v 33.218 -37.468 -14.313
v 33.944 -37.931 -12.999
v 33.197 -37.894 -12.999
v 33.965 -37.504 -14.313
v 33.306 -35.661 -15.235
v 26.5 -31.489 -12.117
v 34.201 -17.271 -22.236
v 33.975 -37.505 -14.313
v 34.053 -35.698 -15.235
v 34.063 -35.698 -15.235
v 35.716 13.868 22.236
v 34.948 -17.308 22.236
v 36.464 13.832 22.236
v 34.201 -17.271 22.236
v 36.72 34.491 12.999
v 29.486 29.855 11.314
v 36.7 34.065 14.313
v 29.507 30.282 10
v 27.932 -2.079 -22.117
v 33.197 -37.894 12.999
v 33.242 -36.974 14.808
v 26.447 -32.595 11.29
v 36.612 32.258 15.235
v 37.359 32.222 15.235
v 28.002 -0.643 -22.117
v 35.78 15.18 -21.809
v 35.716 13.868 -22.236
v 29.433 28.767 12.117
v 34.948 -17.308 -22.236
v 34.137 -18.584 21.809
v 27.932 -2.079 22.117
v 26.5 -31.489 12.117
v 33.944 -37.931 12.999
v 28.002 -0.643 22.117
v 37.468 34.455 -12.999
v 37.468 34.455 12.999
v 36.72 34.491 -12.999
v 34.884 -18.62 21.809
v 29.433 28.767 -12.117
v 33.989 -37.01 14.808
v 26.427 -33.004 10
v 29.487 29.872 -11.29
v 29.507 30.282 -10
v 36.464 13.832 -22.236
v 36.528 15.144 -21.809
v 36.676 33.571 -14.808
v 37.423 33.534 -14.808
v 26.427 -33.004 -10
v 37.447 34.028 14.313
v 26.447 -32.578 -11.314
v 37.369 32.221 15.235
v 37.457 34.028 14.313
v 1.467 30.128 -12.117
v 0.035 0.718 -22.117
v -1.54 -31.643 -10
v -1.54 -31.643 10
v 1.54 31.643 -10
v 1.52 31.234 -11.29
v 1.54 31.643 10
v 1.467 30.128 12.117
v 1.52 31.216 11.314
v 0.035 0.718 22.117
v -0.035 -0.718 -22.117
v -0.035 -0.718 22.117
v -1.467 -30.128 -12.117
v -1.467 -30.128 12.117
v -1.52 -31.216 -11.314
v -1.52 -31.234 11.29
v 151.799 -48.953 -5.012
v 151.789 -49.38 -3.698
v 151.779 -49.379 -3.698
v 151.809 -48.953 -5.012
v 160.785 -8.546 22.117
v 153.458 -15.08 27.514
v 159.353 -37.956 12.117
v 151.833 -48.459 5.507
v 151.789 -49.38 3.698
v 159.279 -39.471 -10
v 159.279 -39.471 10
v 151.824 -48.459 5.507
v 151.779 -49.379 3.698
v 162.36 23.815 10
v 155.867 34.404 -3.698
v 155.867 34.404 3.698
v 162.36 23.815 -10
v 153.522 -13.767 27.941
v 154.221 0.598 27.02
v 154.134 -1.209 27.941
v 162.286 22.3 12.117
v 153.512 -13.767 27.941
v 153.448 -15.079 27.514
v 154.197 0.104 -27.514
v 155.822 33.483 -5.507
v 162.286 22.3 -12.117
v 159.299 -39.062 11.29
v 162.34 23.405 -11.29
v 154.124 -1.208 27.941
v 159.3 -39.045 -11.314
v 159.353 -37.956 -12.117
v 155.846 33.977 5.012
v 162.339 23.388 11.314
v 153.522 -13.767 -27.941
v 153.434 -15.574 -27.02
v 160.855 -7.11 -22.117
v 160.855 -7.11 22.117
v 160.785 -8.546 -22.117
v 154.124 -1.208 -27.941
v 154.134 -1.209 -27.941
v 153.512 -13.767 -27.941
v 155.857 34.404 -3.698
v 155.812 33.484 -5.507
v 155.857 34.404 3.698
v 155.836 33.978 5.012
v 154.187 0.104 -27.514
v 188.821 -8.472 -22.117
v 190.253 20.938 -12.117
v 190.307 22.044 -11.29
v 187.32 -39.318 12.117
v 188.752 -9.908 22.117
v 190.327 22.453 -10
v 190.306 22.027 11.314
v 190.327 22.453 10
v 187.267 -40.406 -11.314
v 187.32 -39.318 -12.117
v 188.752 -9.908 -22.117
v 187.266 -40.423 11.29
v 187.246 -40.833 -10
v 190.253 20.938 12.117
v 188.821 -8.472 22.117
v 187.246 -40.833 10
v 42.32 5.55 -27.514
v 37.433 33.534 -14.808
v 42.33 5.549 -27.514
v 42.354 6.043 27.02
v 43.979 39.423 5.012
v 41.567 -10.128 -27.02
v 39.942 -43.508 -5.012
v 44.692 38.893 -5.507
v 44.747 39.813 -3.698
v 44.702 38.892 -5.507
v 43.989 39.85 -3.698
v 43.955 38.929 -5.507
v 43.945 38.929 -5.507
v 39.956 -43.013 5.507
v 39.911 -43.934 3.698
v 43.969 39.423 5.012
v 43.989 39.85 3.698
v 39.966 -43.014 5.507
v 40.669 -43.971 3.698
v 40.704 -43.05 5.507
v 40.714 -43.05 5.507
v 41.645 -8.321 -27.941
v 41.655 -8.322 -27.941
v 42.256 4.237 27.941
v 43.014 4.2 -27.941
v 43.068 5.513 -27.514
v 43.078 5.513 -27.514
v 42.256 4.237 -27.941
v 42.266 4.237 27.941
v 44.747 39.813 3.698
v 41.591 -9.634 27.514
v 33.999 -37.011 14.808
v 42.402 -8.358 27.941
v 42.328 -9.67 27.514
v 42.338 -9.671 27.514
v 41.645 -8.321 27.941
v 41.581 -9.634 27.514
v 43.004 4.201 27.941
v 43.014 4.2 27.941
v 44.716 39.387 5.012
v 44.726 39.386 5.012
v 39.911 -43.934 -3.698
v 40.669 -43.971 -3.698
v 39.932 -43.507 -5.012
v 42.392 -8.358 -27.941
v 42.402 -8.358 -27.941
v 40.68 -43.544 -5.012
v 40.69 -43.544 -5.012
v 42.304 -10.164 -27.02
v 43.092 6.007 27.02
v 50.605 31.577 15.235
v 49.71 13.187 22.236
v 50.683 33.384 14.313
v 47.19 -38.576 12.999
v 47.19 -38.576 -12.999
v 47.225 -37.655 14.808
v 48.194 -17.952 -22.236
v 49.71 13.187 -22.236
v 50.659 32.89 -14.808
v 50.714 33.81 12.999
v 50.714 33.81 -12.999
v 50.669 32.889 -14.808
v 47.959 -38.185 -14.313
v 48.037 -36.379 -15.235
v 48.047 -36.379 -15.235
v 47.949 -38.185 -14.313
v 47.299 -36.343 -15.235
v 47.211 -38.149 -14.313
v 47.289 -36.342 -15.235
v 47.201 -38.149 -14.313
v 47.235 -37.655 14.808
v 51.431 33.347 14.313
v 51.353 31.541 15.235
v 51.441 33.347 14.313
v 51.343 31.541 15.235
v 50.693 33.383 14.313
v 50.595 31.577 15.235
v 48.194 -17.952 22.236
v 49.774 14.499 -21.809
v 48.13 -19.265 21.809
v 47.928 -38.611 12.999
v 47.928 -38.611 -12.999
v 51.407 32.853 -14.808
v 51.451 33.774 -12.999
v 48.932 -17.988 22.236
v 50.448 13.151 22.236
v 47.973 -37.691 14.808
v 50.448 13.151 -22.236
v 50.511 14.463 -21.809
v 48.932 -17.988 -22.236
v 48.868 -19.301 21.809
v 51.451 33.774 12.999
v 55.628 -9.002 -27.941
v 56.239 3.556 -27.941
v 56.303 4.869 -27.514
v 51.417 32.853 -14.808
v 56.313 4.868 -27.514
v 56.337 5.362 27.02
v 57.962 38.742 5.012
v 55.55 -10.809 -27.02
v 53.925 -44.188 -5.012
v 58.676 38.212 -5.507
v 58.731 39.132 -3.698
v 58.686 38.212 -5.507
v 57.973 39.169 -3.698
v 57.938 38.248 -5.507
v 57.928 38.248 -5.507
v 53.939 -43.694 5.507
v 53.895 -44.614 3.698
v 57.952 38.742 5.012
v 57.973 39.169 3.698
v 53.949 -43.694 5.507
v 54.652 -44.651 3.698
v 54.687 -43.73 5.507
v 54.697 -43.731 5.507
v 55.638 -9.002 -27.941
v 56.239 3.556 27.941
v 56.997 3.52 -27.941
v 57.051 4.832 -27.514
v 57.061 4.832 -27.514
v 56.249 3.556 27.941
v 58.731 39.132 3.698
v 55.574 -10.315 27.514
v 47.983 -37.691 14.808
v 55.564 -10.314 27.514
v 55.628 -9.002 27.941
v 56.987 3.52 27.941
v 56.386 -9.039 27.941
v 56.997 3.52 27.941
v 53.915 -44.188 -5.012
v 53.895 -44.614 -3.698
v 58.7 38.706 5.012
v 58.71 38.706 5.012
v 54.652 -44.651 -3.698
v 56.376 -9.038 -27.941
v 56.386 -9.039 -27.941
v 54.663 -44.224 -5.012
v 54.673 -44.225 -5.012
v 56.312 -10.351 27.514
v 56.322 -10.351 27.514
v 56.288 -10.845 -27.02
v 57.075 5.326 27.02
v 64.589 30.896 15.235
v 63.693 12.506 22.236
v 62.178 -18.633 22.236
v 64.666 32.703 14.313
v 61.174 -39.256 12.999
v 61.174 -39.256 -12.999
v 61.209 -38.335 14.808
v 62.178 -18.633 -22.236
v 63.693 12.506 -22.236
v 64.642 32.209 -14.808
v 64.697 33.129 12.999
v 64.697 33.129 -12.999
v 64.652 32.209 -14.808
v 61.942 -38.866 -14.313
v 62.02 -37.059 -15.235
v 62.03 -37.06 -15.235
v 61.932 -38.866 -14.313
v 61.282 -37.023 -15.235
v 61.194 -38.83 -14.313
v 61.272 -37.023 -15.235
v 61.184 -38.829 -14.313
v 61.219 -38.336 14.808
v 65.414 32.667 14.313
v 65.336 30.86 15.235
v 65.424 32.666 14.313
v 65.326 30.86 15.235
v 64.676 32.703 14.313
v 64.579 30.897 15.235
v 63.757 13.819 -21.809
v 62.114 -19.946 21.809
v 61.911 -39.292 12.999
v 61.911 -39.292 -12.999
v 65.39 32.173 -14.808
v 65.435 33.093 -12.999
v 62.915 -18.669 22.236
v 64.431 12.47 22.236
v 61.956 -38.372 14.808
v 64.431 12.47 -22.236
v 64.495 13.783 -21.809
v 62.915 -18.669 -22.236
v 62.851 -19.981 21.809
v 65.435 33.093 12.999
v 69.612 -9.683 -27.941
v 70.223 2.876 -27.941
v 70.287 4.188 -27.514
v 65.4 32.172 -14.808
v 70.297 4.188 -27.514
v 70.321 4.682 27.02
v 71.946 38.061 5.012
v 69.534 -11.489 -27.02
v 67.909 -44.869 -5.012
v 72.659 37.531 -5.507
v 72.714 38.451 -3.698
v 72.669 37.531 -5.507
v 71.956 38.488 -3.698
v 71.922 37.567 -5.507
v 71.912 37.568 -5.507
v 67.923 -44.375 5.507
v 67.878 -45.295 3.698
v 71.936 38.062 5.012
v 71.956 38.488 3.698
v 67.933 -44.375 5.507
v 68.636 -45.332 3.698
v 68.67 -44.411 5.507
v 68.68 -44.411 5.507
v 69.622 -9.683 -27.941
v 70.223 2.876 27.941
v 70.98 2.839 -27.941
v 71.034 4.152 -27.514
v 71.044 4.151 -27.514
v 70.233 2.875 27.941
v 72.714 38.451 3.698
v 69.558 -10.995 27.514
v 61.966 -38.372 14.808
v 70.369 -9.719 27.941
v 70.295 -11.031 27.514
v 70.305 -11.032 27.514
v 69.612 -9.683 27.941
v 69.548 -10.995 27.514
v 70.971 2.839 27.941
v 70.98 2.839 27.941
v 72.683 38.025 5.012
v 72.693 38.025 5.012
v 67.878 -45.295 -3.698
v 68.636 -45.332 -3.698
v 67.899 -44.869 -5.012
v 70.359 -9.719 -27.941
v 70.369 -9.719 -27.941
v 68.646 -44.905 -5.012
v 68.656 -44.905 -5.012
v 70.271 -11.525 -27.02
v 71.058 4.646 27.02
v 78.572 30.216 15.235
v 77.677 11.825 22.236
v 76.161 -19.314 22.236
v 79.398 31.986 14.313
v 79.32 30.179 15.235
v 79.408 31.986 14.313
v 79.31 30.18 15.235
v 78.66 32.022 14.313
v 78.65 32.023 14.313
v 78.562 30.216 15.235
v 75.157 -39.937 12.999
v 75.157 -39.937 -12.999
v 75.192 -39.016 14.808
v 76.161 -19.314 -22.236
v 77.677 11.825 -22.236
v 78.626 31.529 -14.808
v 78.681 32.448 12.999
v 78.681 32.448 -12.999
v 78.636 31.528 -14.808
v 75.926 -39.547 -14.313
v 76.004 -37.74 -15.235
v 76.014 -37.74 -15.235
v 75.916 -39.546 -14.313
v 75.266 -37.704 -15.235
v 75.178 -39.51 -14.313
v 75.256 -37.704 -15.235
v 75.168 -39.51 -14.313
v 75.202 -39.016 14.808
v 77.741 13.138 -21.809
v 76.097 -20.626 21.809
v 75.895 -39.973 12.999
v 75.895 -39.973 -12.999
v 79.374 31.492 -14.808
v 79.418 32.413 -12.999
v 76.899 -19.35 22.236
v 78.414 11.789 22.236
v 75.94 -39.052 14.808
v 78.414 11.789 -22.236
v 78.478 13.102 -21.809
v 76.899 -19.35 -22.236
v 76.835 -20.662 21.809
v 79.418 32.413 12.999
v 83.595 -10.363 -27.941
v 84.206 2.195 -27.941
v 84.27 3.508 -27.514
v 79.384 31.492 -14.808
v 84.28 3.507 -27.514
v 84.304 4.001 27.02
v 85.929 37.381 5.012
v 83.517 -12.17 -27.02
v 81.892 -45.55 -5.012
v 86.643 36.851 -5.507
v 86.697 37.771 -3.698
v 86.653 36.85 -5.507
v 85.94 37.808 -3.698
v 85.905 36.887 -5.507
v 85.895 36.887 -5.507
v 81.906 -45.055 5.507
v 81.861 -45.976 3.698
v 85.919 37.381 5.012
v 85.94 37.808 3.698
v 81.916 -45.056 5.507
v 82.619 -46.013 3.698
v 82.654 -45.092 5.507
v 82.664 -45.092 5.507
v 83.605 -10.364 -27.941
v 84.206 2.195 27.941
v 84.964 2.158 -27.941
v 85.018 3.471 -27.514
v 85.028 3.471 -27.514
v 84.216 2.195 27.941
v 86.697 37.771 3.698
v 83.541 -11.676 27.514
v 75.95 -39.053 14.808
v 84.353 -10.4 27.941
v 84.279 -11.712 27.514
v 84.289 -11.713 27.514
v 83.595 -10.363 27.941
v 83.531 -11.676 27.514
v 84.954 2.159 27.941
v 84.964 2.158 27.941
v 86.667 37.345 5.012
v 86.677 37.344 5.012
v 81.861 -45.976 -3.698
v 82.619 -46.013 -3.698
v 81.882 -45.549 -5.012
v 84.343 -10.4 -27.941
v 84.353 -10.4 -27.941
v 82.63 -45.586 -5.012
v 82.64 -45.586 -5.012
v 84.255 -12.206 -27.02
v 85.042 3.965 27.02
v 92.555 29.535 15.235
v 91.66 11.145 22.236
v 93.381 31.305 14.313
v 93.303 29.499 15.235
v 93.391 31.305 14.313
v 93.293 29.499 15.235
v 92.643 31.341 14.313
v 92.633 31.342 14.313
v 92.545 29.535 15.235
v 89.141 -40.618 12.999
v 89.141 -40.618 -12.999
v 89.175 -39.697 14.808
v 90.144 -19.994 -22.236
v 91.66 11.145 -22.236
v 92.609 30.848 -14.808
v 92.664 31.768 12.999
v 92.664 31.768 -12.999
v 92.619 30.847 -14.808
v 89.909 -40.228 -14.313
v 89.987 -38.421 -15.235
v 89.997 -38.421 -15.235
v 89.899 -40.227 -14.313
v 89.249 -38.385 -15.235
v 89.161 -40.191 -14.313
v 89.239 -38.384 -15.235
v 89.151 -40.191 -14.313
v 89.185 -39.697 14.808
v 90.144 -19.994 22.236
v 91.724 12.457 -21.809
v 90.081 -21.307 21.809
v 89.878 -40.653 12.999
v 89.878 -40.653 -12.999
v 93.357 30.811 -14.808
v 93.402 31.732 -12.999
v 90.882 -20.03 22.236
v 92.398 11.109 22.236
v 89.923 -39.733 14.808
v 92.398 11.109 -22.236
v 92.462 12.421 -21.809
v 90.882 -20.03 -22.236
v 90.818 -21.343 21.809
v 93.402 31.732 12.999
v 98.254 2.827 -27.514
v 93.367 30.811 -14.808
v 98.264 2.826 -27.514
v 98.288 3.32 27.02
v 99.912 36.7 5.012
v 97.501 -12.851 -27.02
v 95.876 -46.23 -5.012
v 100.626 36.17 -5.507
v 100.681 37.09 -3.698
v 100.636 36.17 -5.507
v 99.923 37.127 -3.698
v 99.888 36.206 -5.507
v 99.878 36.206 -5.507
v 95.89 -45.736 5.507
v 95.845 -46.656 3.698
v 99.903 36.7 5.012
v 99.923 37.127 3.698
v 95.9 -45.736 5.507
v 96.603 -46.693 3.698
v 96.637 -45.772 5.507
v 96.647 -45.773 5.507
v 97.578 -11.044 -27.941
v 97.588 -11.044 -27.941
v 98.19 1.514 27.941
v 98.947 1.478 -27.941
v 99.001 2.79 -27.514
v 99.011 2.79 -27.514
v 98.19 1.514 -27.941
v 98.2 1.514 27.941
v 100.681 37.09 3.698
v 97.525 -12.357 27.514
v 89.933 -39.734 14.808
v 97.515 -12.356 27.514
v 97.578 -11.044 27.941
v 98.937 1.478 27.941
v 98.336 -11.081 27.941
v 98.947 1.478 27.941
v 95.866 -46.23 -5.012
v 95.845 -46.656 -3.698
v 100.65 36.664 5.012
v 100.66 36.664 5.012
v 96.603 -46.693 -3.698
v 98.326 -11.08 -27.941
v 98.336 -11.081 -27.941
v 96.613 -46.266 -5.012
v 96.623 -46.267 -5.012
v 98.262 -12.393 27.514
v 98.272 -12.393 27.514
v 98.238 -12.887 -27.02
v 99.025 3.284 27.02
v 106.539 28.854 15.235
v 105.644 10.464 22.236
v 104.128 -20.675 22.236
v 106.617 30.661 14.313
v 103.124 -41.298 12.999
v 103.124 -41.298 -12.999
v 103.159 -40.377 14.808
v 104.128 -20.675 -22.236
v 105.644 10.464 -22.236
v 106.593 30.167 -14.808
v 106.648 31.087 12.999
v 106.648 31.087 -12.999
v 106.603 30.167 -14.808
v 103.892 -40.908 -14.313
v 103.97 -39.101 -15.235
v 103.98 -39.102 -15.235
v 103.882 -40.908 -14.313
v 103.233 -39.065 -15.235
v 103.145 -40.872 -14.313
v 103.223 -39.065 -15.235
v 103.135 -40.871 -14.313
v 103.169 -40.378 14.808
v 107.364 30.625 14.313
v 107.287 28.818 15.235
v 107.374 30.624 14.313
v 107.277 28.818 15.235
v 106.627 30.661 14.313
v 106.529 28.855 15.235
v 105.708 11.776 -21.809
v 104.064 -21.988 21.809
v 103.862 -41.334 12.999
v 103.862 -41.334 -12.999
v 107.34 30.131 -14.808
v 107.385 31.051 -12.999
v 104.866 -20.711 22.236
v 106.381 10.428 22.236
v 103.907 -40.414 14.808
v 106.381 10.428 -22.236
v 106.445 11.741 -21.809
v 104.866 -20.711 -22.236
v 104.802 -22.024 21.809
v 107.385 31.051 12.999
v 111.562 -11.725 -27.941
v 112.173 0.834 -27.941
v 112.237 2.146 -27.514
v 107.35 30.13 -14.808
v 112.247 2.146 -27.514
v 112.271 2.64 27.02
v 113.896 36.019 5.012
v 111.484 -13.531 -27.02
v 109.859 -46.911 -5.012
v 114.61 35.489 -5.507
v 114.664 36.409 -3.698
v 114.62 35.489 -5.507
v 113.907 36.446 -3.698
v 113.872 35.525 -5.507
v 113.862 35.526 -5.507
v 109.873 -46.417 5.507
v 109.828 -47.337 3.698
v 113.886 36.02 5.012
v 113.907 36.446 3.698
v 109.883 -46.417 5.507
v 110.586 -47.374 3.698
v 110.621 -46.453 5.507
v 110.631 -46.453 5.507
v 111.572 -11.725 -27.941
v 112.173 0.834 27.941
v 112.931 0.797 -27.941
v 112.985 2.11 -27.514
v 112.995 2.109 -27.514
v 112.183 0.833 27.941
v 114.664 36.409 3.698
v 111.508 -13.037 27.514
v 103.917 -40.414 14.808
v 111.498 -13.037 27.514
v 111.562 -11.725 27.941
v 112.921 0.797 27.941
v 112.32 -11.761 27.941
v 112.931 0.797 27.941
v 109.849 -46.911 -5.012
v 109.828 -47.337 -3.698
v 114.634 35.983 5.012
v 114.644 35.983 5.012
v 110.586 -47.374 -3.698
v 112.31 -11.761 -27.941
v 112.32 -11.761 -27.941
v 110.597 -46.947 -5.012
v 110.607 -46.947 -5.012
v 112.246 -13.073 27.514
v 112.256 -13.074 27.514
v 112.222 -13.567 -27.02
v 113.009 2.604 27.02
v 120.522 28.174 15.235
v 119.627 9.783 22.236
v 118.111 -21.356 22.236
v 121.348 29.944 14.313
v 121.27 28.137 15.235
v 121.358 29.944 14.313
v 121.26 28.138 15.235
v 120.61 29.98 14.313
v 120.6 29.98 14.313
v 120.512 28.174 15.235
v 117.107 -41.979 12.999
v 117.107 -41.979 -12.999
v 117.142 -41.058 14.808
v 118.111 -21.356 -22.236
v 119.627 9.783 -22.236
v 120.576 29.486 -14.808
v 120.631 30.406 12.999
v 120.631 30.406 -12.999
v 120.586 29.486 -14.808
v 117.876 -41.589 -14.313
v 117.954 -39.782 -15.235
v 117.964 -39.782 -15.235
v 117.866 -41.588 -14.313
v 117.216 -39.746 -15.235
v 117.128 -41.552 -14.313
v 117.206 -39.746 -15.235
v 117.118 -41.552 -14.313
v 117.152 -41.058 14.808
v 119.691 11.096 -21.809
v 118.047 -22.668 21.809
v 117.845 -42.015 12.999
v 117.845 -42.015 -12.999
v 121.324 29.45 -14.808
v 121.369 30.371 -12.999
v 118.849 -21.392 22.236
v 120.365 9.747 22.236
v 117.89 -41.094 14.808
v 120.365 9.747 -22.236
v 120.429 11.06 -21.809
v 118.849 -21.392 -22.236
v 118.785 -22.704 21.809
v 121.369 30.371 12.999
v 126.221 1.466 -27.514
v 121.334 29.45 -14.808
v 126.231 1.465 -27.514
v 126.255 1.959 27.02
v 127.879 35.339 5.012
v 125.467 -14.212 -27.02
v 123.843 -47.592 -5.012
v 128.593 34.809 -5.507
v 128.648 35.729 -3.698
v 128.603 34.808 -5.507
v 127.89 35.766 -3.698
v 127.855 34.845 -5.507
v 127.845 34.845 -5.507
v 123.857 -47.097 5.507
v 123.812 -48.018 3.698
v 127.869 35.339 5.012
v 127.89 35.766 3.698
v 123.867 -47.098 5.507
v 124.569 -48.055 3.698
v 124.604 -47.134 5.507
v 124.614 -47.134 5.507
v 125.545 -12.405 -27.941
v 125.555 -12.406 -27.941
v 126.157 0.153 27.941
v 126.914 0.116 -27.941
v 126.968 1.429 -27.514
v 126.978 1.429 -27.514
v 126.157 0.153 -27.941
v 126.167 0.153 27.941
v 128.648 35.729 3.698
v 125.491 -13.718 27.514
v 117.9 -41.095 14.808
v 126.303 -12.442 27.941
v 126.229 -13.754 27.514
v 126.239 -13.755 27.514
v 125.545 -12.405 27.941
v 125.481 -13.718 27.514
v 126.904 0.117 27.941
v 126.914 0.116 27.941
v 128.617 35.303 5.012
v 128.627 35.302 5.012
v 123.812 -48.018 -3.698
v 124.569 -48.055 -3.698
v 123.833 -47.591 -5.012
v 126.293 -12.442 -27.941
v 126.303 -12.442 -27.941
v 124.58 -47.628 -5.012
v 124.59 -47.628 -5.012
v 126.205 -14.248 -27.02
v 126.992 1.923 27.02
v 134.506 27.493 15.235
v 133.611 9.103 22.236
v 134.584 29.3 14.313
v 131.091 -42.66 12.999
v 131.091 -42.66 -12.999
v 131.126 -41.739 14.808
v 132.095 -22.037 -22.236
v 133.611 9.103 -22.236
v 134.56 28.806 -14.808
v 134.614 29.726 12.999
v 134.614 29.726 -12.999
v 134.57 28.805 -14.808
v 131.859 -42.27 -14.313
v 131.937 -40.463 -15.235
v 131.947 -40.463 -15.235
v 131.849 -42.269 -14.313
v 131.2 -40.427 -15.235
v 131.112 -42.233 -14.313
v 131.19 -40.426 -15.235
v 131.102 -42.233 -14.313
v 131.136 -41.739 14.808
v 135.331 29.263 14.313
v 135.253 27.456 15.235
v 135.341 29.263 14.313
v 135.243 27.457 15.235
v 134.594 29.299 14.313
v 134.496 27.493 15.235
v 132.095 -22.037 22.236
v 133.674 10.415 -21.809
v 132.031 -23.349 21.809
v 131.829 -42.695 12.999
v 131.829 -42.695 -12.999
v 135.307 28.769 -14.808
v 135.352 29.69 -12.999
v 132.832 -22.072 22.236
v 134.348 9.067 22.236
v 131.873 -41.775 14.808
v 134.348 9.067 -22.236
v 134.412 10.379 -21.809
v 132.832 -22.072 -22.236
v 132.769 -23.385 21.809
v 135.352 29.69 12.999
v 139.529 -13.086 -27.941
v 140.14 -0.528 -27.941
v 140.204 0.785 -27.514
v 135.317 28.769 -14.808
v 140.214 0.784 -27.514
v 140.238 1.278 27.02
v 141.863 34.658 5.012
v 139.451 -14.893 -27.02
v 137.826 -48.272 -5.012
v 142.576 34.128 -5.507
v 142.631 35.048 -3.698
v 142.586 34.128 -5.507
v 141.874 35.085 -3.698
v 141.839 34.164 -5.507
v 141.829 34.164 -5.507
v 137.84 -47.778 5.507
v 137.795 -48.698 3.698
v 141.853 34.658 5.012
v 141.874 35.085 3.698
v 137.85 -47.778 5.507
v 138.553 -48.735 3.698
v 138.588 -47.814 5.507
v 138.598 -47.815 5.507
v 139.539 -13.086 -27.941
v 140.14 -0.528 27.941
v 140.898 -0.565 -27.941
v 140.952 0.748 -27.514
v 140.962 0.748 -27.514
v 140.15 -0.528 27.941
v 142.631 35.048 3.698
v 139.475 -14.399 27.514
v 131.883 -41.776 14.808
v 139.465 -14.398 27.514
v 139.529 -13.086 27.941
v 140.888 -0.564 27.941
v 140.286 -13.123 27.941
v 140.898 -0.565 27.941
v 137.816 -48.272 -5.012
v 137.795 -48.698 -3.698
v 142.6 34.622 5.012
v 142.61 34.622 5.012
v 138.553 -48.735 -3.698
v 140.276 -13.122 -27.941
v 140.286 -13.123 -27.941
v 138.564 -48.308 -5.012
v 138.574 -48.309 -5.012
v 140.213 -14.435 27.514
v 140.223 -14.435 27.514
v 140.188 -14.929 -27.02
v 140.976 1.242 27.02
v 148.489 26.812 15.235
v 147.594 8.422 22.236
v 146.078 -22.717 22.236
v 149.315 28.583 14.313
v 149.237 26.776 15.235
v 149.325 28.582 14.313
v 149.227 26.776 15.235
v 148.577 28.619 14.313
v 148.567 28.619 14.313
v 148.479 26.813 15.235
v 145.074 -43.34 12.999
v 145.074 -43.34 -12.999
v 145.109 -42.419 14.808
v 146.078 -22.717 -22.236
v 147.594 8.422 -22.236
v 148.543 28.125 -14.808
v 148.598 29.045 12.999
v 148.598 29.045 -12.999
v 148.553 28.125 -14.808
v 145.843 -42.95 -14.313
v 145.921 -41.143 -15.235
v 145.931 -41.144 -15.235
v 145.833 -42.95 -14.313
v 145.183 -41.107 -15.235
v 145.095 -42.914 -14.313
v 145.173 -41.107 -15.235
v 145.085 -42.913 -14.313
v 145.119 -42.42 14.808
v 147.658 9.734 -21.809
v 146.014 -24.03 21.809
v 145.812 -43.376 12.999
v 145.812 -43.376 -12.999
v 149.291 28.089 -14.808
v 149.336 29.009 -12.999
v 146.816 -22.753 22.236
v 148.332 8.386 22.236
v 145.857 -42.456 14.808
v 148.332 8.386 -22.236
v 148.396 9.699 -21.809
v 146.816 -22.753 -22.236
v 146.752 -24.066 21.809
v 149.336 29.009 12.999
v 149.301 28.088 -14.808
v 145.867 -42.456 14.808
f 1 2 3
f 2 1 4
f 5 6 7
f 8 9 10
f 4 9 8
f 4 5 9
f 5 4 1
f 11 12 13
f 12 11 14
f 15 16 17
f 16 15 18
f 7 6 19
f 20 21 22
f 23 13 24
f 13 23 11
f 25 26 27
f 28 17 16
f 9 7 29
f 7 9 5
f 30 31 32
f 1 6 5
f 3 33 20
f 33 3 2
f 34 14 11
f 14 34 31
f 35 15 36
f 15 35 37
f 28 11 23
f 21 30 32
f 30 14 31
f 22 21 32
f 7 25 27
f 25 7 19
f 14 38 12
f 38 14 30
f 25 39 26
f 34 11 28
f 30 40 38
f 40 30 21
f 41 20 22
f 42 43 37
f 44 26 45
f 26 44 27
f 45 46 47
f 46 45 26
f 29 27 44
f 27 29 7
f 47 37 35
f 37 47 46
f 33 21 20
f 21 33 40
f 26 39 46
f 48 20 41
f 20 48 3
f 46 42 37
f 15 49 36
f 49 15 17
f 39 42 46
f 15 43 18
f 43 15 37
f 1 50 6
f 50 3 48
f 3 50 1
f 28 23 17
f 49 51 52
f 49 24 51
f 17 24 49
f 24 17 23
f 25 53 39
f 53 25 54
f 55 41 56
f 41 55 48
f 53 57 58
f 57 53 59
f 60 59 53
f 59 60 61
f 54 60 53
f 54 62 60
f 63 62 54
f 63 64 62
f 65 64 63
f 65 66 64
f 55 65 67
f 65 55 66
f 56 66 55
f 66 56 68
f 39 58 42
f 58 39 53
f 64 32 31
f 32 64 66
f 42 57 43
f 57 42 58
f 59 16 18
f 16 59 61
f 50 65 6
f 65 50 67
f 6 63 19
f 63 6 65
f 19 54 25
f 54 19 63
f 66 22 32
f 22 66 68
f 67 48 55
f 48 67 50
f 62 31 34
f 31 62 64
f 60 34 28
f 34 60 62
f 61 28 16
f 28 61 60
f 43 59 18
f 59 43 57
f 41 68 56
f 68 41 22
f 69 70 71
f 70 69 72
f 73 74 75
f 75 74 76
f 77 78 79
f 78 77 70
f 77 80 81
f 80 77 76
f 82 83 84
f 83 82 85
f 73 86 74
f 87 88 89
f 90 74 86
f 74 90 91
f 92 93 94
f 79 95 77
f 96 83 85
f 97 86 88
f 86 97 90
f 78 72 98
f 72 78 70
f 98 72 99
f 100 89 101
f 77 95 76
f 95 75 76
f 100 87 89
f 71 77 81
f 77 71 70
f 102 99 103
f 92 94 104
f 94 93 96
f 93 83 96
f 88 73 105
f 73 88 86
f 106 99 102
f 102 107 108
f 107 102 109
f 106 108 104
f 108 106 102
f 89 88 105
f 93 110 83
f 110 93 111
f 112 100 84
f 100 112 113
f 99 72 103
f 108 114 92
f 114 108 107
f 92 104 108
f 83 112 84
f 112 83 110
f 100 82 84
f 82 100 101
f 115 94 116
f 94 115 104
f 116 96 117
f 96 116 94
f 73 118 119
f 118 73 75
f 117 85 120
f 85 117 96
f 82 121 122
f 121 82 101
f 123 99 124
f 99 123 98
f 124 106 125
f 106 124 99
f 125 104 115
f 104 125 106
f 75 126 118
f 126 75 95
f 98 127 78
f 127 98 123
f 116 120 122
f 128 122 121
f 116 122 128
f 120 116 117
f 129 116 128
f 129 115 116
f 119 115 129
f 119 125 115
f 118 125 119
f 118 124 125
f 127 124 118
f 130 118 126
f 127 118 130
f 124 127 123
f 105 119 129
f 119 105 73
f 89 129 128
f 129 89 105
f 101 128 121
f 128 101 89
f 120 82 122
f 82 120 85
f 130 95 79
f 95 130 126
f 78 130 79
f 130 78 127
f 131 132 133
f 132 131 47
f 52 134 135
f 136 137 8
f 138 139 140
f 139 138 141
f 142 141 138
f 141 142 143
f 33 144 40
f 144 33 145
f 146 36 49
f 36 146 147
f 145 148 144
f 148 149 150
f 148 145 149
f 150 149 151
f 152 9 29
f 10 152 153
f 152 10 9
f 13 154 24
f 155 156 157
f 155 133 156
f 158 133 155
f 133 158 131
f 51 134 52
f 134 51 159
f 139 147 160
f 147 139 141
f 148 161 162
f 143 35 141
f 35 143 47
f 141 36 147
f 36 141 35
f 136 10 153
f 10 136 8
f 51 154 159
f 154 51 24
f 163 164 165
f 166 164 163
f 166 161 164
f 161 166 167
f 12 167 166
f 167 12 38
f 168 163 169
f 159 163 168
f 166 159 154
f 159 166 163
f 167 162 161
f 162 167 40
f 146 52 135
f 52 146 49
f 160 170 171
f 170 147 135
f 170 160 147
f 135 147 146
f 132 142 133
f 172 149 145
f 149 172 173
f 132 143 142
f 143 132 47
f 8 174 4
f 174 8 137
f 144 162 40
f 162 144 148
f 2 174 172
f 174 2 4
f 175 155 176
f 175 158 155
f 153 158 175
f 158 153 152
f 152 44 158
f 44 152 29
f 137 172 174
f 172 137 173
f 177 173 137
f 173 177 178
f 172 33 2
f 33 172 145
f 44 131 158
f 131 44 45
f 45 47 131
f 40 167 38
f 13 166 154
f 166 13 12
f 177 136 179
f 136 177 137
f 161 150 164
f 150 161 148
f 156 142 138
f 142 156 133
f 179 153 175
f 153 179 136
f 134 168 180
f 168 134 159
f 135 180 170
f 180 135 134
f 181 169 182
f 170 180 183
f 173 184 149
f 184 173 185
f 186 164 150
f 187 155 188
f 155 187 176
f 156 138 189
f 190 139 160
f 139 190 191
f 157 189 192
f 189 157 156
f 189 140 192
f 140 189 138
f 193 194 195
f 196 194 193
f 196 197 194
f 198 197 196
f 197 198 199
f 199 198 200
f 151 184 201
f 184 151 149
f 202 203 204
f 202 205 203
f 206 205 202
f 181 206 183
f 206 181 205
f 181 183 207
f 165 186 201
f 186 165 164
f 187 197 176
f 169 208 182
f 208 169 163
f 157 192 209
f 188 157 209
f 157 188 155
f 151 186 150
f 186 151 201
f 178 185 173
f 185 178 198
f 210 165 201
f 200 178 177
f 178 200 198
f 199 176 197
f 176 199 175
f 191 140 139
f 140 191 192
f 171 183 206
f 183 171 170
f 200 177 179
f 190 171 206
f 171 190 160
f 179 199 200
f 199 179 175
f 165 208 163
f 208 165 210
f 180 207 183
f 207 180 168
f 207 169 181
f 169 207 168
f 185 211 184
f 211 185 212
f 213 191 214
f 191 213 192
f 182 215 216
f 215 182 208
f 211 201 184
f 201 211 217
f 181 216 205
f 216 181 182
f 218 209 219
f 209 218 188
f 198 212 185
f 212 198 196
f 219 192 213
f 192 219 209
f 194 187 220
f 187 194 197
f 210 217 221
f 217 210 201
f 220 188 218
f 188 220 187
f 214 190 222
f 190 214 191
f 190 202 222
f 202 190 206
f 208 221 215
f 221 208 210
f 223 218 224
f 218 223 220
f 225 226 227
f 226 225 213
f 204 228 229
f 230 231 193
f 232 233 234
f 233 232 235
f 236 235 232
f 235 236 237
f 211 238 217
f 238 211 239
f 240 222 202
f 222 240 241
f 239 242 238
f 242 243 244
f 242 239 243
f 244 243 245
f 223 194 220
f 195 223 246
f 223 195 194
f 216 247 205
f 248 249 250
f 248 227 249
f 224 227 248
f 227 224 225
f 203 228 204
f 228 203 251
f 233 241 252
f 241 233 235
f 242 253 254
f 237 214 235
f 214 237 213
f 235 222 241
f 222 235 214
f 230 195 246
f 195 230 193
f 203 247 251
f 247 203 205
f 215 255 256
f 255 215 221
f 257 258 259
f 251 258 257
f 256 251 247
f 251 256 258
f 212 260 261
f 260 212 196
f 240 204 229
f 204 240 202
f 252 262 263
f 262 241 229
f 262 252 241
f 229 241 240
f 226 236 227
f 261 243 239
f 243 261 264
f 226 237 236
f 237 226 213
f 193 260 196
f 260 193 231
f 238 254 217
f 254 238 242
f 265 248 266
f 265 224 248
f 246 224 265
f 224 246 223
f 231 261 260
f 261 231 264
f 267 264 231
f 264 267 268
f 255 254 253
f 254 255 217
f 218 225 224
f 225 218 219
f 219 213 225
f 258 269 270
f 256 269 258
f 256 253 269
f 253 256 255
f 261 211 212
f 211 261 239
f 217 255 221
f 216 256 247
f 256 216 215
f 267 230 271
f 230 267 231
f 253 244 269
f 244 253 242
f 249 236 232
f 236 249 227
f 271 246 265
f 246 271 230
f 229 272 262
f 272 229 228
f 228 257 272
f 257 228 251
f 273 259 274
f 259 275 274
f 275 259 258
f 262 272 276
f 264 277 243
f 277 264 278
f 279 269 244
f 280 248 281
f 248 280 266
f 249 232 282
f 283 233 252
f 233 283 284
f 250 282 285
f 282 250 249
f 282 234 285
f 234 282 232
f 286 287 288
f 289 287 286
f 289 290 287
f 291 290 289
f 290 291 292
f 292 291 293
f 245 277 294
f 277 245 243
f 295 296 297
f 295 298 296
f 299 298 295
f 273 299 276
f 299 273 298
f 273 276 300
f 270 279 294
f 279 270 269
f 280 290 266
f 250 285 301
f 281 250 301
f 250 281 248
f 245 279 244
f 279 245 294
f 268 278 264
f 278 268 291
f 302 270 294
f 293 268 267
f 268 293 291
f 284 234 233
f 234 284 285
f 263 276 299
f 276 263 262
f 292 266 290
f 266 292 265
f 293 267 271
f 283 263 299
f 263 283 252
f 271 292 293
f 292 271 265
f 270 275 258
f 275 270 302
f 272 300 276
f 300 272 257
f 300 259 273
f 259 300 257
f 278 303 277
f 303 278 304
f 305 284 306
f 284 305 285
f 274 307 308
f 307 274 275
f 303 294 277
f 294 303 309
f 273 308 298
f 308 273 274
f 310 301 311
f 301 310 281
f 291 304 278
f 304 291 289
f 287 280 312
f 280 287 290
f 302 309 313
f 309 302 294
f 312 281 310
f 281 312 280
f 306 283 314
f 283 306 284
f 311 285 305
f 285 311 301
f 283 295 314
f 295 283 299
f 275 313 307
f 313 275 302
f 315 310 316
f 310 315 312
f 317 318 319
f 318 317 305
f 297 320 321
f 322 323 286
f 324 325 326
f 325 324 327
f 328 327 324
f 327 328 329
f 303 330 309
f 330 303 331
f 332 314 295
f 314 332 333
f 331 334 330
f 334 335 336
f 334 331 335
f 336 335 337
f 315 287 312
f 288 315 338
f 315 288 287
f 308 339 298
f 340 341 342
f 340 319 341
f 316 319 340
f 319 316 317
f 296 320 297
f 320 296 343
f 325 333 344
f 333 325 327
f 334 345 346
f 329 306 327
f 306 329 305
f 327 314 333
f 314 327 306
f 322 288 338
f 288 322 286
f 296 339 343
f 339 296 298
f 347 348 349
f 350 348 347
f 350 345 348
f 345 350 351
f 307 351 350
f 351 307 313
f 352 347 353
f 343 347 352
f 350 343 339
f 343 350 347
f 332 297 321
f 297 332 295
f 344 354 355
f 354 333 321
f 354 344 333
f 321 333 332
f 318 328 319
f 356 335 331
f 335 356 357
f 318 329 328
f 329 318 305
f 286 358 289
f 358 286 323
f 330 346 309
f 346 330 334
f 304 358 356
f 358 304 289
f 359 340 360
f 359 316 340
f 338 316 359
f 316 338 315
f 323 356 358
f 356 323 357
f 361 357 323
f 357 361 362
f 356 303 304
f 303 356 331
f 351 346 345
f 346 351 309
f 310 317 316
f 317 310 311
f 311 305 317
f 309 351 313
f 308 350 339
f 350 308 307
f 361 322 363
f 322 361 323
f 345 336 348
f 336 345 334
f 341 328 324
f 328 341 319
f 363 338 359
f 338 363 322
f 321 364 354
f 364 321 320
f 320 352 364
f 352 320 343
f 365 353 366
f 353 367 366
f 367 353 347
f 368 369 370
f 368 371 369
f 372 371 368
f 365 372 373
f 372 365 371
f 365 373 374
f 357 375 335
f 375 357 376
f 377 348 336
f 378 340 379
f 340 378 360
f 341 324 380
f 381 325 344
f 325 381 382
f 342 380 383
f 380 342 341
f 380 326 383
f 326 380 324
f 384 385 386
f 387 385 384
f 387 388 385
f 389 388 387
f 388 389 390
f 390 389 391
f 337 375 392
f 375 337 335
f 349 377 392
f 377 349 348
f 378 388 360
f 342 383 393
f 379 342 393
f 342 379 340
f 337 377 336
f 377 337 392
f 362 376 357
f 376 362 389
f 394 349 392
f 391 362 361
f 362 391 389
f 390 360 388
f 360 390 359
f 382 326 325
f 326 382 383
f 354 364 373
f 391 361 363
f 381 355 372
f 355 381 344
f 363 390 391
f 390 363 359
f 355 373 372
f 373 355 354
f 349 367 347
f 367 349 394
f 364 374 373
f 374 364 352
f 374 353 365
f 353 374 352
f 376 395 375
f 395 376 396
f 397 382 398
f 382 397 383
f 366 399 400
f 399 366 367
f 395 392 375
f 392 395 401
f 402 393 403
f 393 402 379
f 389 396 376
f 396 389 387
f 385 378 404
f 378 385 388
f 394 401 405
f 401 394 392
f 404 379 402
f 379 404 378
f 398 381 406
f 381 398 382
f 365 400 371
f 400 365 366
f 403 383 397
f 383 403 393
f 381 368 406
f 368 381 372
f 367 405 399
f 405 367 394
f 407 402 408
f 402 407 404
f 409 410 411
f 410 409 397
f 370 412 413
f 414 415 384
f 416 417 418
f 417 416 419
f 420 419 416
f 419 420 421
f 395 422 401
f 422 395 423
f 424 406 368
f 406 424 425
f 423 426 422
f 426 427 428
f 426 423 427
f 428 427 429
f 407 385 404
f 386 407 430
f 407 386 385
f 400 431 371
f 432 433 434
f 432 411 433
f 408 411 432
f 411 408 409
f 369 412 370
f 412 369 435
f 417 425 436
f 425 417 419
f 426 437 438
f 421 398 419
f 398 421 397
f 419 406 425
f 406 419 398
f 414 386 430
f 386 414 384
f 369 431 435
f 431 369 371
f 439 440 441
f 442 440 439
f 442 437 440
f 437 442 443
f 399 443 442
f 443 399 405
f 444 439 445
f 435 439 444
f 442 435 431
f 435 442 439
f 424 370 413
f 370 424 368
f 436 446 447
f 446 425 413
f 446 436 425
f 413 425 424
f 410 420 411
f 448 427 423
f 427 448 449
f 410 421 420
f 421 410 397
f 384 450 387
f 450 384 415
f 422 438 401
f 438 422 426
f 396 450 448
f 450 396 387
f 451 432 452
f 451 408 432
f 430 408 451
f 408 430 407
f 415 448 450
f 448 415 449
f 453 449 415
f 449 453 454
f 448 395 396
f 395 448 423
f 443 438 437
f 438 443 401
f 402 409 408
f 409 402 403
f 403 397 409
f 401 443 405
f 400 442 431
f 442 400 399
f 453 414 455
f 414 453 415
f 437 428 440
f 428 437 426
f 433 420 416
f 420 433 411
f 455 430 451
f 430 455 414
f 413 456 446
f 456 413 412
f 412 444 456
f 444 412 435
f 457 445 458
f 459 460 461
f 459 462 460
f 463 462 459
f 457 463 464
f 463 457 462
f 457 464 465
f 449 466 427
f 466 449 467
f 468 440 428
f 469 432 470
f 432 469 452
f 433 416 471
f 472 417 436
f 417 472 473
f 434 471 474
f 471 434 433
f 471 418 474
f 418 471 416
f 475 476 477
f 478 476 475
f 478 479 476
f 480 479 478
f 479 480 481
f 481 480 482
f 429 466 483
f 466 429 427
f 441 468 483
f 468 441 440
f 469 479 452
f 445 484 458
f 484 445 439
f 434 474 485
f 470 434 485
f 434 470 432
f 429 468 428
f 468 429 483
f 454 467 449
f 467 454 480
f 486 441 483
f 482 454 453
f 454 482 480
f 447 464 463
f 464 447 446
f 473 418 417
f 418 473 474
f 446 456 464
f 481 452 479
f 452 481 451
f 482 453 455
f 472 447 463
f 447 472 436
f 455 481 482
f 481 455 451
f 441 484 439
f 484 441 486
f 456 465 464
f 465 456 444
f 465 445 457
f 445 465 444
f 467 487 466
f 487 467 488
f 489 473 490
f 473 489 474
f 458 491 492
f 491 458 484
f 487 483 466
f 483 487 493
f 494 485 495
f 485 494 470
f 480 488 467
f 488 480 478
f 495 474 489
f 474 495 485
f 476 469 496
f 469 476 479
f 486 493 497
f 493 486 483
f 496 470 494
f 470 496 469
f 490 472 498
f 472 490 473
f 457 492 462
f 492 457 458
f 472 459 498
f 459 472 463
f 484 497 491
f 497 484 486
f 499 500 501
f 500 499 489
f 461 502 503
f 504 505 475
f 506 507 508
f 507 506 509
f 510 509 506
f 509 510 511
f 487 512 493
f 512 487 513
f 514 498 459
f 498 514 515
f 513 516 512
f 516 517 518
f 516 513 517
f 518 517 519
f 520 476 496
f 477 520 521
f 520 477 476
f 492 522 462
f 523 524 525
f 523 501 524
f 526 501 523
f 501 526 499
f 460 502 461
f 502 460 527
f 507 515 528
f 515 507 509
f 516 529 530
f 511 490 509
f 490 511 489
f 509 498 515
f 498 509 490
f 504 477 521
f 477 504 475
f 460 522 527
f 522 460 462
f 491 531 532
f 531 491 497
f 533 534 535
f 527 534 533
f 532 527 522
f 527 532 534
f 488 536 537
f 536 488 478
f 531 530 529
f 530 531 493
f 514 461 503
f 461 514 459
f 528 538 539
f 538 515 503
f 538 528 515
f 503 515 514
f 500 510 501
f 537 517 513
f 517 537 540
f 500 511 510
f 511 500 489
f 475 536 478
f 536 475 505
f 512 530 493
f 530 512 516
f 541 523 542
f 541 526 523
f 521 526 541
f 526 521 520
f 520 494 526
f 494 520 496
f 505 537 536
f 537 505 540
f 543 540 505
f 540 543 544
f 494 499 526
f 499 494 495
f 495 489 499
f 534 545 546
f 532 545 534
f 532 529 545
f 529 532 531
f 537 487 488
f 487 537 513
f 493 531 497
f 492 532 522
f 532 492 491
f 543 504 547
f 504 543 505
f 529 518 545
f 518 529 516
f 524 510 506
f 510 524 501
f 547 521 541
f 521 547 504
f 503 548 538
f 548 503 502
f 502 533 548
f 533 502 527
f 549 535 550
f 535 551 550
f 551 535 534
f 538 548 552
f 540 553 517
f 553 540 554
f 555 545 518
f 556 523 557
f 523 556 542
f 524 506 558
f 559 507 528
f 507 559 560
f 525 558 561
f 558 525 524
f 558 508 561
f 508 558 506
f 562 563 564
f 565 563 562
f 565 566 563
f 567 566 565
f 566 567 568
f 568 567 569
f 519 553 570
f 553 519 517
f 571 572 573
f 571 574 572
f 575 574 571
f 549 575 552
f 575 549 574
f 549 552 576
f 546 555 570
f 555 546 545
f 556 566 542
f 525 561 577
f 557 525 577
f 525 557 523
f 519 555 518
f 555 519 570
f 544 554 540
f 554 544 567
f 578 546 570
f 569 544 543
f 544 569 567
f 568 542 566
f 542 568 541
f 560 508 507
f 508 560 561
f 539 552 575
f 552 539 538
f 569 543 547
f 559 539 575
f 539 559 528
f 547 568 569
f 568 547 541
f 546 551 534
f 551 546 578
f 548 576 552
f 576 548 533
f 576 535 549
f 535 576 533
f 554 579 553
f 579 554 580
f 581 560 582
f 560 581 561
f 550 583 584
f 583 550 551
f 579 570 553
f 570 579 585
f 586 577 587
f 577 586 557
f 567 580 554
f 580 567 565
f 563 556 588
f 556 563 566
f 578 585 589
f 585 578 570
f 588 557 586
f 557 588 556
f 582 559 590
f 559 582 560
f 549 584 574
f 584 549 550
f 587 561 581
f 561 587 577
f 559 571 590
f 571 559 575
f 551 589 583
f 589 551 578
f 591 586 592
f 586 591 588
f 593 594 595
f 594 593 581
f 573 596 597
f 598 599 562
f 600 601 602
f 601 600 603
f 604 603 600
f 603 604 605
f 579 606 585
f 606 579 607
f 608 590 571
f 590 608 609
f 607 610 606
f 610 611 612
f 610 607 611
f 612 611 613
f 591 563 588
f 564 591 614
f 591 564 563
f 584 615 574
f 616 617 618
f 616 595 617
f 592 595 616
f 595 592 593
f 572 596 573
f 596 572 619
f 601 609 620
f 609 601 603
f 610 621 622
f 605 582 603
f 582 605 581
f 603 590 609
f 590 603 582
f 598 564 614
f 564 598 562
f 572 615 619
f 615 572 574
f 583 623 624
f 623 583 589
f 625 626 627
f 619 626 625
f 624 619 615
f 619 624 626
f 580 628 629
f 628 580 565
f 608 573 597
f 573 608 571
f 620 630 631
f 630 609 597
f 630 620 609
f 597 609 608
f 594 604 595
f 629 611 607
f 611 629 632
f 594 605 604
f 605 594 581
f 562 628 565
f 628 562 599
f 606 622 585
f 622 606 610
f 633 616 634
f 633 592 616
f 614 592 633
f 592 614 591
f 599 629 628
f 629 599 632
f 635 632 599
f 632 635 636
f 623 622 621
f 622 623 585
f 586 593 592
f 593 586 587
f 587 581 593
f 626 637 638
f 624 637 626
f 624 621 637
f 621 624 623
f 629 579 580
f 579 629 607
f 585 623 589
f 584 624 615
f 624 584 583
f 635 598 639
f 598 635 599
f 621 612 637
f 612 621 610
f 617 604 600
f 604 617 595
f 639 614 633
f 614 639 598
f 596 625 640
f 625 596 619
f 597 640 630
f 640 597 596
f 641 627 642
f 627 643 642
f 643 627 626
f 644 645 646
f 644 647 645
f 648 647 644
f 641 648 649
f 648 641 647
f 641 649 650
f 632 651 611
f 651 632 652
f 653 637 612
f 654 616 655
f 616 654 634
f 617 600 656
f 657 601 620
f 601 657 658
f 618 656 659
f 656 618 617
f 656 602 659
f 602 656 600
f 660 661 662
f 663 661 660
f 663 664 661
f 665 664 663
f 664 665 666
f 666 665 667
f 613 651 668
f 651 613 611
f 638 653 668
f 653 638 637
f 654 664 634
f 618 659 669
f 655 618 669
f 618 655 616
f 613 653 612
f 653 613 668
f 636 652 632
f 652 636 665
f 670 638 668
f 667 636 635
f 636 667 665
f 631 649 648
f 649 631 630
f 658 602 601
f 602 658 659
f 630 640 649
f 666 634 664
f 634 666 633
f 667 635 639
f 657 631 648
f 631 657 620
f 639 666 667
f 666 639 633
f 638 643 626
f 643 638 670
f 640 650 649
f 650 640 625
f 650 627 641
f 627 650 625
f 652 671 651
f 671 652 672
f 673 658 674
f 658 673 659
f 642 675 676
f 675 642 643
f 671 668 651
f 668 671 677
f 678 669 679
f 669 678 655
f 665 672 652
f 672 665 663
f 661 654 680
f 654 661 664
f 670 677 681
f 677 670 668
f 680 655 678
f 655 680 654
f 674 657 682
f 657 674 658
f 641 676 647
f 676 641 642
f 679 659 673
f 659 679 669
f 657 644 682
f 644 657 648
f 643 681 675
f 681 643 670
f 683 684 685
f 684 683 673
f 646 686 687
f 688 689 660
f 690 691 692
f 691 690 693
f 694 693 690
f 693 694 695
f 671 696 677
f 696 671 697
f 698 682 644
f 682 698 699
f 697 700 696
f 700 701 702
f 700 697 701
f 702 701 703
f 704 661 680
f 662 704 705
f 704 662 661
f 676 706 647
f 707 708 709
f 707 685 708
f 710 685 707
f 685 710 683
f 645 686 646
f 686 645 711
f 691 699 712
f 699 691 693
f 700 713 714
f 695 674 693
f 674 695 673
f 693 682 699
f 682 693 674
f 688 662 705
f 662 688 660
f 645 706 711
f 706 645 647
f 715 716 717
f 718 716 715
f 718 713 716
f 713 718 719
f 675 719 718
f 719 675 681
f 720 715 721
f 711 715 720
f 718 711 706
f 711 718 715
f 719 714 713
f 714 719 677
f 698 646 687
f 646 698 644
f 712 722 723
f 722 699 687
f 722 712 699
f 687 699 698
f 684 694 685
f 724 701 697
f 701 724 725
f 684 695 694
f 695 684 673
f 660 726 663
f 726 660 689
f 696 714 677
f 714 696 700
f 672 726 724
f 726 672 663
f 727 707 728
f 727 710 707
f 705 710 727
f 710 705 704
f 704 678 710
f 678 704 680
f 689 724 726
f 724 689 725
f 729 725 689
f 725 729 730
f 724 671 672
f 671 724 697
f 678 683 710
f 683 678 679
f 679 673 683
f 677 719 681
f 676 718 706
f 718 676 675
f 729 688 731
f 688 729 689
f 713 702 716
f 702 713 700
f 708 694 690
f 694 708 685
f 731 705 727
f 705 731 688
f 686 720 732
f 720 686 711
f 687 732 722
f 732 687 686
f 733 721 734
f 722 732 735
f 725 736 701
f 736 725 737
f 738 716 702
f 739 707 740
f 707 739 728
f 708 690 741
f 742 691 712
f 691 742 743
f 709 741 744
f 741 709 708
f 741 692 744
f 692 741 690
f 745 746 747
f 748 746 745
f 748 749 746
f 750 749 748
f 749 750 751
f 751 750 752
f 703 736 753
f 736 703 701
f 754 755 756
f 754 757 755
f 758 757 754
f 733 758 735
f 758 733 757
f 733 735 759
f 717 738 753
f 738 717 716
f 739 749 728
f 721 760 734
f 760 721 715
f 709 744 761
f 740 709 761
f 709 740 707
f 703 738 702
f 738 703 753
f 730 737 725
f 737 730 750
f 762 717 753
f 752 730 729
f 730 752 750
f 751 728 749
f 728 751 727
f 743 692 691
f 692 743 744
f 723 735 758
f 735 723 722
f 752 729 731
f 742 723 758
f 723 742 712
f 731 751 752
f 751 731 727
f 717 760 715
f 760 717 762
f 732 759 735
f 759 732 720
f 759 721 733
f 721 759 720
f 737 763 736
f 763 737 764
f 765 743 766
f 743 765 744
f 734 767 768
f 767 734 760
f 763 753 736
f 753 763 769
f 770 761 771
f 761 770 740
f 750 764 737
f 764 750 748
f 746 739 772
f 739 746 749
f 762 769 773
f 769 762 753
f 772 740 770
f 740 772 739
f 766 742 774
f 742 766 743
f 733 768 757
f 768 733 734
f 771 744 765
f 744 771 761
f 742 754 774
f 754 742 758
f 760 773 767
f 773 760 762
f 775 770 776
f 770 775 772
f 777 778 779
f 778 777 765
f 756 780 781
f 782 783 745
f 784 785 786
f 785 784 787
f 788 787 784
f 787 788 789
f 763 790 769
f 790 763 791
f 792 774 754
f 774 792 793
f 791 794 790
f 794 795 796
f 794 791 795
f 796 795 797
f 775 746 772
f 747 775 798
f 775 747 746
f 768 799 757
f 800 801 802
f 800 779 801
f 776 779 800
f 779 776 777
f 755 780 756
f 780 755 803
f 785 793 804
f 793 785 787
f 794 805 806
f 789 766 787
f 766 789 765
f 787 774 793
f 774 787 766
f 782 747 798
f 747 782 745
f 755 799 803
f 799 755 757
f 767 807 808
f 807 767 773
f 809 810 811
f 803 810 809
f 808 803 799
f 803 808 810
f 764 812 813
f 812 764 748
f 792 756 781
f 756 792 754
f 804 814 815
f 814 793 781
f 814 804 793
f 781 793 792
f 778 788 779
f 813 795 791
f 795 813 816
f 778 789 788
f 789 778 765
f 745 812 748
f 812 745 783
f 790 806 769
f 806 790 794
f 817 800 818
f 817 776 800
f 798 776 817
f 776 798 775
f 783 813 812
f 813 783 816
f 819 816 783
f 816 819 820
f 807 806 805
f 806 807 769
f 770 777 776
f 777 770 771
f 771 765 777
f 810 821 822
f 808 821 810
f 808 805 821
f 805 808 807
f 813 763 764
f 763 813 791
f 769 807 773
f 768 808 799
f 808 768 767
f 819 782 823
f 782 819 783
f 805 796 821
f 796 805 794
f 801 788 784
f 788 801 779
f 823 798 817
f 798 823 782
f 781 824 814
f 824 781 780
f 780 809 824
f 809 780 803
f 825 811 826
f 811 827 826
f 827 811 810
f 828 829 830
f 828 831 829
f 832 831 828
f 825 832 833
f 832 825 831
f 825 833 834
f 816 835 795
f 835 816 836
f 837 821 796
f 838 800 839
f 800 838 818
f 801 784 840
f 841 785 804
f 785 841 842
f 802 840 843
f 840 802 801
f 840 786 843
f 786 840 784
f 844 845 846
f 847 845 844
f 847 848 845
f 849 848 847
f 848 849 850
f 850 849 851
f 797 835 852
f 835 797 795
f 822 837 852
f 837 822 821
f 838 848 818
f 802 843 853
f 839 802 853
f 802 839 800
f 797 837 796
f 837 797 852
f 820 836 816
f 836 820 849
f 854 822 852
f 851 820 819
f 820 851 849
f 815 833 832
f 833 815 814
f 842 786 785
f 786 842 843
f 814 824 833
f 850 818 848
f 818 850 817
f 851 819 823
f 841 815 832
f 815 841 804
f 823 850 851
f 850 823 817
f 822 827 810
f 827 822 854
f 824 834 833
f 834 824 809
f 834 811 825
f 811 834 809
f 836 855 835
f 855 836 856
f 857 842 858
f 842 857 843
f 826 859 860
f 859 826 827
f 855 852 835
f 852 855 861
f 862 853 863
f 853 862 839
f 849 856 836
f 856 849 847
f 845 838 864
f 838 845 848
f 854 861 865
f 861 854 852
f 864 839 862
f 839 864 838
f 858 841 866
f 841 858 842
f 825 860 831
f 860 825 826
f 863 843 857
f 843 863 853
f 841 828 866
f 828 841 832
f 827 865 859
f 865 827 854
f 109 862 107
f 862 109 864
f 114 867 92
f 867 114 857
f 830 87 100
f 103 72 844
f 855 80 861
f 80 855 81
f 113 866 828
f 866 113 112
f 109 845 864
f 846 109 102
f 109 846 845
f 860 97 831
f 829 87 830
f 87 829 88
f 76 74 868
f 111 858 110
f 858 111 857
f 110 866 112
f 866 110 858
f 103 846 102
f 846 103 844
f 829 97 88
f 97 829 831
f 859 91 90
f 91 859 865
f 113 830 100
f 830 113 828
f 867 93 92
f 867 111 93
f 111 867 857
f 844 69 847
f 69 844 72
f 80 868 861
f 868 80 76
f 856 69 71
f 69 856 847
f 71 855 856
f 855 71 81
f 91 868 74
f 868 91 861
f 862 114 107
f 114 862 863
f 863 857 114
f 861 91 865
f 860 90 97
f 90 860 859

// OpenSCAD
x = round(rnd(25,150));
y = round(rnd(25,150));
approx_z = rnd(40,200);
steps =  round(rnd(approx_z /5,approx_z /20));
step = round(approx_z/steps);

z = step*steps;
step2 = floor(step * 2);
ext = rnd(1.5,1.7);
radi = rnd(0,3);
verticalsegment = rnd(0,1);
sleeve = round(rnd(35,35));
sleeve_ext = 0;
sleeveext = sleeve*sleeve_ext;
sleeveFN = rnd(3,20);

hx=x/2;
hy=y/2;
 rotate([45,90,rnd(360)]){
color("RoyalBlue" )sleeves();
color("RoyalBlue" )body();
  * translate([0, 0,  -z*0.25])color("Gray" )scale([x*0.5,y*0.5,1])cylinder(z*1.5+sleeve*2,0.9,0.9,  $fn=sleeveFN);
}
echo (ext);
module sleeves() {
  hull() {
    translate([0, 0, verticalsegment+  sleeve]) plane(x, y, 0);
    translate([0, 0,   sleeve]) plane(x, y, 0);
    translate([0, 0, sleeve- min(step,sleeve*0.5)]) sleeve(x, y);
  }
  hull() {
    translate([0, 0, sleeve- min(step,sleeve*0.5)]) sleeve(x, y);
    translate([0, 0, 0]) sleeve(x, y);
  }

  hull() {
    translate([0, 0, sleeve]) plane(x, y, z);
    translate([0, 0, z + sleeve + min(step,sleeve*0.5)]) sleeve(x, y);
  }
  hull() {
    translate([0, 0, z + sleeve + sleeve]) sleeve(x, y);
    translate([0, 0, z + sleeve + min(step,sleeve*0.5)]) sleeve(x, y);
  }
}
module body() {
  for (i = [0: step: z - step]) {
    hull() {
      translate([0, 0, verticalsegment + sleeve]) plane(x, y, i);
      translate([0, 0, sleeve]) plane(x, y, i);
    }
    hull() {
      translate([0, 0, verticalsegment + sleeve]) plane(x, y, i);
      translate([0, 0, sleeve]) plane(x, y, i + step);
    }
  }
}
module plane(x, y, z) {
  translate([0, 0, z]) linear_extrude(0.01) offset(r = radi, $fn = 10){
 square([x -hx * ext + ext*((z +step ) % step2) * ext, y + ((z  ) % step2) * ext], center = true);
 square([x + ((z ) % step2) * ext, y   -hy*ext+ ext*((z +step ) % step2) * ext ], center = true);
}
}
module sleeve(x, y) {
  translate([0, 0, 0]) linear_extrude(0.01) offset(r = radi, $fn = 10) scale([x + sleeveext * 2, y + sleeveext * 2])circle(0.5,$fn=sleeveFN);}

function rnd(a=0,b=1)=(rands(min(a,b),max(a,b),1)[0]);
